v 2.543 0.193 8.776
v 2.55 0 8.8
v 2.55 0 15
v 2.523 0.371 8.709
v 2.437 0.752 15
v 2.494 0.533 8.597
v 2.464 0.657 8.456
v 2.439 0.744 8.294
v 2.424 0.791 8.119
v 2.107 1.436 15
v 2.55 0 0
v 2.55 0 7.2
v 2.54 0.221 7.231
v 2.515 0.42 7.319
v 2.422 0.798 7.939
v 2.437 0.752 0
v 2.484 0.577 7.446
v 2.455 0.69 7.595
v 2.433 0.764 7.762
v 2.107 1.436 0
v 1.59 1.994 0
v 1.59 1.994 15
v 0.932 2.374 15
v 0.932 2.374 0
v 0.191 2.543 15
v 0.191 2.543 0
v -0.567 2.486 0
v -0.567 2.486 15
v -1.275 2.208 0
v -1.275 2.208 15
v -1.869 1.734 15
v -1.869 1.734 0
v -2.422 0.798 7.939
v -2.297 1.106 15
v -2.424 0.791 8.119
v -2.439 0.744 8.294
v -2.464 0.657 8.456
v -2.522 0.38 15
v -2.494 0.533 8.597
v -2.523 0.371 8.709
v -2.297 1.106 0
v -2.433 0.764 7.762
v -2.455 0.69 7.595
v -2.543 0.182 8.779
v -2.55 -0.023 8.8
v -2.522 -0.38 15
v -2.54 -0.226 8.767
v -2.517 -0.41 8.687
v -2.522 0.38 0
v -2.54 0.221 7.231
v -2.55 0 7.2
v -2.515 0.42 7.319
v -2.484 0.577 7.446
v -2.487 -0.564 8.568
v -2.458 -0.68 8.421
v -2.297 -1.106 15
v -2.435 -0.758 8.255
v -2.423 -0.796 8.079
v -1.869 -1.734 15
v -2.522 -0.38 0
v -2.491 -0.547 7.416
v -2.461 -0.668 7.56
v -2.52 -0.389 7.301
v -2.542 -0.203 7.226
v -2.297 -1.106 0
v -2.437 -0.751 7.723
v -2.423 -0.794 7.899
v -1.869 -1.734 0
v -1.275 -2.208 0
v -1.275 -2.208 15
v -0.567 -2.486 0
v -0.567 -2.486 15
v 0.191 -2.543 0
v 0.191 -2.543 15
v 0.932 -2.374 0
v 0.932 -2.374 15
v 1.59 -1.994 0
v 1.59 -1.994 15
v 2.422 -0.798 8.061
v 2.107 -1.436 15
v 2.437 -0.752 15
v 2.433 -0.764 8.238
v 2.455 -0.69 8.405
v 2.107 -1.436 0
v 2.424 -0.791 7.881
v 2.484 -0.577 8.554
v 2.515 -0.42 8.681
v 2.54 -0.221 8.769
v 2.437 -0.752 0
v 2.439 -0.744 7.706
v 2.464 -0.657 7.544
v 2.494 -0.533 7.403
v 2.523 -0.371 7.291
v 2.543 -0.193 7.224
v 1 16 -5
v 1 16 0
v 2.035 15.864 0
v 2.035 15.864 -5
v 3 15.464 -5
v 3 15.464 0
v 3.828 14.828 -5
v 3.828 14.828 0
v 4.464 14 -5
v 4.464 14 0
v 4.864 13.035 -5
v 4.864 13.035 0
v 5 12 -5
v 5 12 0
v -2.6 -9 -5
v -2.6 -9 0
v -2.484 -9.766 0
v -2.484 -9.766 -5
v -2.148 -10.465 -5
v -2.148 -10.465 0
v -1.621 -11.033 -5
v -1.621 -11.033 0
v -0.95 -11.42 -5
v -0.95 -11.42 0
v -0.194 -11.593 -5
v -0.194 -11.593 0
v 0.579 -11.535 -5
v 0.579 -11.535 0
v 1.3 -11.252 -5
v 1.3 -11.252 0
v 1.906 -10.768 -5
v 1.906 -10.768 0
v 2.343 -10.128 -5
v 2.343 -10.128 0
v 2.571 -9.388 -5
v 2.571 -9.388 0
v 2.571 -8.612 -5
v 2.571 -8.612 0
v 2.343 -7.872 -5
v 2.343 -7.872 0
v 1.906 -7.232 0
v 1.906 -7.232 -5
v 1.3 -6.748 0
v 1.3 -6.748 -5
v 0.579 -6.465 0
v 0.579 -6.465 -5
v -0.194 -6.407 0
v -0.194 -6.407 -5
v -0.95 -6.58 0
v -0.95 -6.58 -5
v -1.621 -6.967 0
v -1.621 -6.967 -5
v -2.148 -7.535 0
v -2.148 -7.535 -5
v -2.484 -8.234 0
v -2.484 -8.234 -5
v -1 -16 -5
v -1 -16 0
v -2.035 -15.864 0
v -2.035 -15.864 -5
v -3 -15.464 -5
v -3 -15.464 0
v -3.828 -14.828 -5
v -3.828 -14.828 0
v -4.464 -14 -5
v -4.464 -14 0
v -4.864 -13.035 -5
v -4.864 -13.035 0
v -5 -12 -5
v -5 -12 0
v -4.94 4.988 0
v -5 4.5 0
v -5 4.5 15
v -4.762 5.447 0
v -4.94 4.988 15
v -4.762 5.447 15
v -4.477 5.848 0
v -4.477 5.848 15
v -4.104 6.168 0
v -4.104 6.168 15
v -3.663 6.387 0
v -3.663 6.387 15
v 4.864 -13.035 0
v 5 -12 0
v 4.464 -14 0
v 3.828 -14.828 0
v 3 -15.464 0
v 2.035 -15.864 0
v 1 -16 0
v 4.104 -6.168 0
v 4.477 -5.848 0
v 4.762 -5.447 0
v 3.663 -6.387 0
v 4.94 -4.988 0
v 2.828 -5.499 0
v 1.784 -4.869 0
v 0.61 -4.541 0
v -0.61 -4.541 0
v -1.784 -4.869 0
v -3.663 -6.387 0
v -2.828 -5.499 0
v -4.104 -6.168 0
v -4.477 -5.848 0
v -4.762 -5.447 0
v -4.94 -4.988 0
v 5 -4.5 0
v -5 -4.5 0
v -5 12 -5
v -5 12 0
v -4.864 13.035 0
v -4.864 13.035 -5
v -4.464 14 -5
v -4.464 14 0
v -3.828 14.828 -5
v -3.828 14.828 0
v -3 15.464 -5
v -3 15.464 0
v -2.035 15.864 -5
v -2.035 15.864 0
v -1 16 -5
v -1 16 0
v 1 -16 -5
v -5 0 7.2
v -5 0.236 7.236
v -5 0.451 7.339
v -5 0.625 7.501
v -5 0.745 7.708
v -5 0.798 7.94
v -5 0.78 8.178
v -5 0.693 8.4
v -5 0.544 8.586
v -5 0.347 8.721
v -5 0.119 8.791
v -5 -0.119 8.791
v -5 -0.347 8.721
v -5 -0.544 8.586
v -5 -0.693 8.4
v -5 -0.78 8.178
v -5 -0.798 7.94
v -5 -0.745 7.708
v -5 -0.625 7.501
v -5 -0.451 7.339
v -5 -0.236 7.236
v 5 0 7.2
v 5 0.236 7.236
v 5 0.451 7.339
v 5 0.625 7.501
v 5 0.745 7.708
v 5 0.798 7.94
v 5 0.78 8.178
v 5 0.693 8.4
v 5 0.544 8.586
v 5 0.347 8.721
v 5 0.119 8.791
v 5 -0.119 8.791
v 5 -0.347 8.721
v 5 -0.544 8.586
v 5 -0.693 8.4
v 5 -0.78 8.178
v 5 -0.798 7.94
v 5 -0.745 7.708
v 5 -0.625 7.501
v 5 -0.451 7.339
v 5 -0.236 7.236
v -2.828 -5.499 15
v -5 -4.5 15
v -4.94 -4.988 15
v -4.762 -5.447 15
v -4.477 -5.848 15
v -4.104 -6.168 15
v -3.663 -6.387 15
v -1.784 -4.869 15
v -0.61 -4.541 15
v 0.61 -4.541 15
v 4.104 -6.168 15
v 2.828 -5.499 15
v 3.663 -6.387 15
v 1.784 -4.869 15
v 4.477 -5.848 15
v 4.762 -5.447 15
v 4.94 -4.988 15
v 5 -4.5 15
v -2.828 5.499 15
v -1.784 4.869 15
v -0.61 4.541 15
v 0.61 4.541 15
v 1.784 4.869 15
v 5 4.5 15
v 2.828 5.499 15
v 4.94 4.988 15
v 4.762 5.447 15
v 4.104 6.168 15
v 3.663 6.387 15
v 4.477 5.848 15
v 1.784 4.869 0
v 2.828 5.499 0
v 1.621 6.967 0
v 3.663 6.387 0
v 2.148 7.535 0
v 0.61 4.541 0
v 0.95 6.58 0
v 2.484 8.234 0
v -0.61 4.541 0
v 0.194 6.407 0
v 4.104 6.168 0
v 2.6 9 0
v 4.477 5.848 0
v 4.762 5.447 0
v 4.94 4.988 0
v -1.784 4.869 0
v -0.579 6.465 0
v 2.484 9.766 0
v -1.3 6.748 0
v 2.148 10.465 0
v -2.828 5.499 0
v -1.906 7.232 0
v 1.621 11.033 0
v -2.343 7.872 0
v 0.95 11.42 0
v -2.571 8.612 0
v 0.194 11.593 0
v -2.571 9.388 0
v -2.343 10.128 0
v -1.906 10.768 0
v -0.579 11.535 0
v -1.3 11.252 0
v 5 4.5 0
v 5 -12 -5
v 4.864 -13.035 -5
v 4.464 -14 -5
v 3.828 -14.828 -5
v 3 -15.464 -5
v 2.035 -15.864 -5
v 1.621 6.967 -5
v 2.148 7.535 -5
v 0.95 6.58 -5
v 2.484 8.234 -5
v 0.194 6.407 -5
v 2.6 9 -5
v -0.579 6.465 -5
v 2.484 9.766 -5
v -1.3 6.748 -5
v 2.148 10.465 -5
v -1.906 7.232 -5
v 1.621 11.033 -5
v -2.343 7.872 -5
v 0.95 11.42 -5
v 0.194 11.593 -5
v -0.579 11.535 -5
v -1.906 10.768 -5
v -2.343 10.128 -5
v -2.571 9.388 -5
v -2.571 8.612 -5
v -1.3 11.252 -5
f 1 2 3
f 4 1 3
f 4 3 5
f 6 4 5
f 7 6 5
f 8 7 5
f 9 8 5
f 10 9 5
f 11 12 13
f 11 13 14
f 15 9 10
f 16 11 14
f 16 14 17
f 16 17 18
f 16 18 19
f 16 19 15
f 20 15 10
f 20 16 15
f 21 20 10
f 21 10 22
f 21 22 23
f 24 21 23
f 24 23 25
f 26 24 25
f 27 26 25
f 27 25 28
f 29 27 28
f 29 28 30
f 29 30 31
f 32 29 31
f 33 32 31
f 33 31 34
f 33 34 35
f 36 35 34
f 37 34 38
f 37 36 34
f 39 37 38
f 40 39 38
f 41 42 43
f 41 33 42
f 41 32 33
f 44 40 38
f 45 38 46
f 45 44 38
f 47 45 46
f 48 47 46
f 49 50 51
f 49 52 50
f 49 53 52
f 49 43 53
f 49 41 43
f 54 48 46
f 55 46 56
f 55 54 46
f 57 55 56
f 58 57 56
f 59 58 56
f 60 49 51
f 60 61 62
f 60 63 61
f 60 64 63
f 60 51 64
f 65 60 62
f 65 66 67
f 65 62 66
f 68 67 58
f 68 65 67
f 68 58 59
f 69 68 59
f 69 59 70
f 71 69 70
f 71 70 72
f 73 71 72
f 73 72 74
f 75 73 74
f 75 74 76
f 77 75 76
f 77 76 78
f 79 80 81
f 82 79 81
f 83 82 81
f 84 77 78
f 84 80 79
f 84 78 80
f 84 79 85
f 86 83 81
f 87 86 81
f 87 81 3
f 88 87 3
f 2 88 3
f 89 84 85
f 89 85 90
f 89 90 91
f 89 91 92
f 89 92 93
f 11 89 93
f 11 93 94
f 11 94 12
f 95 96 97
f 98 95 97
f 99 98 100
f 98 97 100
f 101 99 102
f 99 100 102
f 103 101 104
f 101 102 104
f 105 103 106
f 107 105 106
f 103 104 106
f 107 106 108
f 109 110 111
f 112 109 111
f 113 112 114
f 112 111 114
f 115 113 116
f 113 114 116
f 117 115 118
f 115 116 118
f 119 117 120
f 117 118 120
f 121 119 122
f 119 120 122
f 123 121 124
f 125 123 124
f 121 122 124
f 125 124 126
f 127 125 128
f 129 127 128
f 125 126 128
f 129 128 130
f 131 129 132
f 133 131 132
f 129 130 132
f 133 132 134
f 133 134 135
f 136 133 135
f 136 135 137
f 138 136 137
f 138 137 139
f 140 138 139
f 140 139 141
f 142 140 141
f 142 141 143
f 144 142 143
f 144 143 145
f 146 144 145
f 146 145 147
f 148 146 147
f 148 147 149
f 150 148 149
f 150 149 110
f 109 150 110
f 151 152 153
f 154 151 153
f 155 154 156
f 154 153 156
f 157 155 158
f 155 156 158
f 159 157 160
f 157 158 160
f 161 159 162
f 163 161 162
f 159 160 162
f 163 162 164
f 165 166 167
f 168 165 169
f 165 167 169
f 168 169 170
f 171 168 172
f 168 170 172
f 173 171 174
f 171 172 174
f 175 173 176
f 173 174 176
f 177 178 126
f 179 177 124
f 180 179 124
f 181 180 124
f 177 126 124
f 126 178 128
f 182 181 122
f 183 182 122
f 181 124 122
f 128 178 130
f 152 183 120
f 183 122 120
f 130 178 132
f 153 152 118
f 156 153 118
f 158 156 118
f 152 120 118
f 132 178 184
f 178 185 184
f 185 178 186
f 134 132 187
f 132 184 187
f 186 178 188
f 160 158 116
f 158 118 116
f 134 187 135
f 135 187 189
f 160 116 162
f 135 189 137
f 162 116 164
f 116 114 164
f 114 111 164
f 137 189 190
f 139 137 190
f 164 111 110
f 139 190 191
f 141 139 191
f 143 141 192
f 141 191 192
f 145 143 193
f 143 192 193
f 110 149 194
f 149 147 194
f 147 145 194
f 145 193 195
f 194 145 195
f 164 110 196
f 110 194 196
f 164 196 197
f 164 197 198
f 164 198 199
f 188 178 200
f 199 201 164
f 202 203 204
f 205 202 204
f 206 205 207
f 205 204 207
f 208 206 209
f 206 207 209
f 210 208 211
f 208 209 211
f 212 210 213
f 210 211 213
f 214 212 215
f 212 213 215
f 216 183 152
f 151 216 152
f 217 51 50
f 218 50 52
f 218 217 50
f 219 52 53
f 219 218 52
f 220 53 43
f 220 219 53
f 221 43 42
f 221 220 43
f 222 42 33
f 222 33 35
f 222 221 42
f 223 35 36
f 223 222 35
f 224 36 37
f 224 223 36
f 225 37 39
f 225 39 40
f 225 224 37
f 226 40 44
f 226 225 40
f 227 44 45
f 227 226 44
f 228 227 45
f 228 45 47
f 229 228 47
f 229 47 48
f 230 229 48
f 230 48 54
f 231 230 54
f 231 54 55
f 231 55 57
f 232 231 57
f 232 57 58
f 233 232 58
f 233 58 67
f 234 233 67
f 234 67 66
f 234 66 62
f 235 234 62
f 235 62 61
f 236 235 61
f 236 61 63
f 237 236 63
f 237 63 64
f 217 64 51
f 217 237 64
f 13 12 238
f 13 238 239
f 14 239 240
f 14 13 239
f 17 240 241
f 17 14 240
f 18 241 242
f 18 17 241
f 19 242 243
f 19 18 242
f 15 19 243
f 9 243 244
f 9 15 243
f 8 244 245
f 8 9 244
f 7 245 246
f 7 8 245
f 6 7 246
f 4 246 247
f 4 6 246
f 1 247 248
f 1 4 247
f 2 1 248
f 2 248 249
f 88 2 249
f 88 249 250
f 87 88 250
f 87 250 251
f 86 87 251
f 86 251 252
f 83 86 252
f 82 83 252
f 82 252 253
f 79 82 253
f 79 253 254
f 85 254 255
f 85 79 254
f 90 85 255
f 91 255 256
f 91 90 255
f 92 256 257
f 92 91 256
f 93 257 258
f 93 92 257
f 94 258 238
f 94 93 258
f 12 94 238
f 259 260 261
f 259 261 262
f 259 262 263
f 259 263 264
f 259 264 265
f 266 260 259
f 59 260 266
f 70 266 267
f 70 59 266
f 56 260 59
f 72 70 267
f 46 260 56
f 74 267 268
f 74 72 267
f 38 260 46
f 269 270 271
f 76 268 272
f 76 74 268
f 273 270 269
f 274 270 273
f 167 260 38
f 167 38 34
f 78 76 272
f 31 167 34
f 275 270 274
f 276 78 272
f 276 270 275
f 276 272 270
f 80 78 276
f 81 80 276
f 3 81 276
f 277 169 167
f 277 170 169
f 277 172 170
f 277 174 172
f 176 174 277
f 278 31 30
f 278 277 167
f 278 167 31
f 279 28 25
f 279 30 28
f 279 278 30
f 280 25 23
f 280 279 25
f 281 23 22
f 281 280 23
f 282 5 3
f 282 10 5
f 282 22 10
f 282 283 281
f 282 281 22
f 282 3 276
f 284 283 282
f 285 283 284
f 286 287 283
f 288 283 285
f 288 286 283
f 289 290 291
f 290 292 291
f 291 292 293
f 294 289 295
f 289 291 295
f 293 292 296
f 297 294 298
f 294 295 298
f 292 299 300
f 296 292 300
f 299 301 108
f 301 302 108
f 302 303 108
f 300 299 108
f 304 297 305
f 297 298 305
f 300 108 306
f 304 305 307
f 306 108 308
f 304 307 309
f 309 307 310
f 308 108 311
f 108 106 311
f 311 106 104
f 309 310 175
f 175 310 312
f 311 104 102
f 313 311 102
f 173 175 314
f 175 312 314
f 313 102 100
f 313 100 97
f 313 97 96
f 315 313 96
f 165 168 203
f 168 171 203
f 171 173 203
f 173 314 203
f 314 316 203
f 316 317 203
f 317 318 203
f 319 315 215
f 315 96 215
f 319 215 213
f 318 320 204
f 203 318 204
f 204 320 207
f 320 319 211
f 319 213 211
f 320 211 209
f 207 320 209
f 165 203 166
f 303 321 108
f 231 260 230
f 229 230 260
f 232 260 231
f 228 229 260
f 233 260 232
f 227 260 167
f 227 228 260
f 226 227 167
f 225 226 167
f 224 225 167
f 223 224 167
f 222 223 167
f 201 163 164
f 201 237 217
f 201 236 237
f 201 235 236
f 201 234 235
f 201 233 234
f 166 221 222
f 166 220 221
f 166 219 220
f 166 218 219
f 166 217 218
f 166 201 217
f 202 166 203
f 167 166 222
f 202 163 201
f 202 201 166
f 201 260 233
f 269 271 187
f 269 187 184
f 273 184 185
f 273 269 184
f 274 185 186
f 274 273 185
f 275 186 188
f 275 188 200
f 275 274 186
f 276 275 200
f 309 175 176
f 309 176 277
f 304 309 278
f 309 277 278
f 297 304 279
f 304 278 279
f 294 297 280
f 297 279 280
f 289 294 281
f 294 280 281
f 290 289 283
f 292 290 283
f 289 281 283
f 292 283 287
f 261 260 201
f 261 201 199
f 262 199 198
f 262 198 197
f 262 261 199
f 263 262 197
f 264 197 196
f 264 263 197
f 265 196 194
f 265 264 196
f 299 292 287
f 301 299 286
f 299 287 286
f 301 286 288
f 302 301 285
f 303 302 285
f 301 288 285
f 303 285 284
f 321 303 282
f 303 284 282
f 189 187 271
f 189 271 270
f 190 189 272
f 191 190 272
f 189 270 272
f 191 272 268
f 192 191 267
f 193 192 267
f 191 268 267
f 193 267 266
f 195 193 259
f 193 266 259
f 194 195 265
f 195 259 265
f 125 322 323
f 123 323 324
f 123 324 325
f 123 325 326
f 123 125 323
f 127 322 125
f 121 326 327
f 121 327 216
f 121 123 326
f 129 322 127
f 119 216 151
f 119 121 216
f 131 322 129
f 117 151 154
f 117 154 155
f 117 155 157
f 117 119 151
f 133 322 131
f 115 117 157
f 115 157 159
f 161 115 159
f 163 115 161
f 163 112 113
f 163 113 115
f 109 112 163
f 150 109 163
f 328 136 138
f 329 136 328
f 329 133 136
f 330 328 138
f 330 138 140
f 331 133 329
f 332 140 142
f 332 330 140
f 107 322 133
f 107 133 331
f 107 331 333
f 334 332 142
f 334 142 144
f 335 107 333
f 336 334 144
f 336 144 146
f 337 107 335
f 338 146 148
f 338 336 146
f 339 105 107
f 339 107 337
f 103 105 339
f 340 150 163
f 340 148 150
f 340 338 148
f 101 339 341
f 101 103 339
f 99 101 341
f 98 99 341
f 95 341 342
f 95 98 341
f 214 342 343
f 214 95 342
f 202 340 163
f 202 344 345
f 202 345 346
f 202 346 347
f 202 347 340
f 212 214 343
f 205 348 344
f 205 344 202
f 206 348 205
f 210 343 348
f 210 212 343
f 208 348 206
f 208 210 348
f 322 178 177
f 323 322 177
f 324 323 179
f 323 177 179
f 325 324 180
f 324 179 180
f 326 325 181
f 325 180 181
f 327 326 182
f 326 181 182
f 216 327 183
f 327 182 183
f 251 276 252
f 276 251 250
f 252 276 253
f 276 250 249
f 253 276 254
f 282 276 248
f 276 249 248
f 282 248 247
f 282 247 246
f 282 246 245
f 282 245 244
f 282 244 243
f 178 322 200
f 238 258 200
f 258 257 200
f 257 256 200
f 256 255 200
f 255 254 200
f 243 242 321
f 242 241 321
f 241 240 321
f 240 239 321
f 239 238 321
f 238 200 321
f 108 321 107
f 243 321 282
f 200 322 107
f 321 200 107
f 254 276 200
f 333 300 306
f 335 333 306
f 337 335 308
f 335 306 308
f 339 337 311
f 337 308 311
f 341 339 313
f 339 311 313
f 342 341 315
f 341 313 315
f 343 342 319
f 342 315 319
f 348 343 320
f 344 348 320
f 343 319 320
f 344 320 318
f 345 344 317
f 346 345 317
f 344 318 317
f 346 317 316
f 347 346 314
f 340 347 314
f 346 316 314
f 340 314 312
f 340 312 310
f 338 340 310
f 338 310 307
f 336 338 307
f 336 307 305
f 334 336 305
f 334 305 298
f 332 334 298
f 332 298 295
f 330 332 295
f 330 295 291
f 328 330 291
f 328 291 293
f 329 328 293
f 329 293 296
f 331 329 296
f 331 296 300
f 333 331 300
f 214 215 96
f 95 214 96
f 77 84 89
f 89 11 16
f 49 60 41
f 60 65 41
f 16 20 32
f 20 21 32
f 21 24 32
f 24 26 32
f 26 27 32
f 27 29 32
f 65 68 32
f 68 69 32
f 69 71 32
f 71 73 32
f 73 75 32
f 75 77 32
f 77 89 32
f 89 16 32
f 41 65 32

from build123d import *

# Parameters (mm, degrees)
SKETCH1_R               = 2.6
BOSS_EXTRUDE1_DEPTH     = 5
SKETCH2_W               = 10
SKETCH2_H               = 13
SKETCH2_R               = 2.55
BOSS_EXTRUDE3_DEPTH     = 15
FILLET2_R               = 2
SKETCH6_R               = 4.5
CUT_EXTRUDE2_DEPTH      = 15
CUT_EXTRUDE3_DEPTH      = 25.103941586
CUT_EXTRUDE3_DEPTH_BACK = 25.103941586
SKETCH7_R               = 0.8


with BuildPart() as part:
    # Sketch1 → Boss-Extrude1 (new body)
    with BuildSketch(Plane.XY):
        with BuildLine():
            Line((-5, -12), (-5, 12))
            ThreePointArc((-5, 12), (-3.828427125, 14.828427125), (-1, 16))
            Line((-1, 16), (1, 16))
            ThreePointArc((1, 16), (3.828427125, 14.828427125), (5, 12))
            Line((5, 12), (5, -12))
            ThreePointArc((5, -12), (3.828427125, -14.828427125), (1, -16))
            Line((1, -16), (-1, -16))
            ThreePointArc((-1, -16), (-3.828427125, -14.828427125), (-5, -12))
        make_face()
        with Locations((0, 9)):
            Circle(SKETCH1_R, mode=Mode.SUBTRACT)
        with Locations(Location((0, -9, 0), (0, 0, 180))):
            Circle(SKETCH1_R, mode=Mode.SUBTRACT)
    extrude(amount=-BOSS_EXTRUDE1_DEPTH)

    # Sketch2 → Boss-Extrude3 (add)
    with BuildSketch(Plane.XY):
        Rectangle(SKETCH2_W, SKETCH2_H)
        Circle(SKETCH2_R, mode=Mode.SUBTRACT)
    extrude(amount=BOSS_EXTRUDE3_DEPTH)

    # Fillet2
    fillet2_edges = [part.edges().sort_by_distance(p)[0] for p in [
        (5, -6.5, 7.5),
        (5, 6.5, 7.5),
        (-5, 6.5, 7.5),
        (-5, -6.5, 7.5),
    ]]
    fillet(fillet2_edges, radius=FILLET2_R)

    # Sketch6 → Cut-Extrude2 (cut)
    with BuildSketch(Plane.XY.offset(15)):
        with Locations((0, 9)):
            Circle(SKETCH6_R)
        with Locations((0, -9)):
            Circle(SKETCH6_R)
    extrude(amount=-CUT_EXTRUDE2_DEPTH, mode=Mode.SUBTRACT)

    # Sketch7 → Cut-Extrude3 (cut, two sides: drawn at the far end of the back side and taken through both)
    with BuildSketch(Plane(origin=(5, 0, 0), x_dir=(0, 0, -1), z_dir=(1, 0, 0)).offset(-CUT_EXTRUDE3_DEPTH_BACK)):
        with Locations((-8, 0)):
            Circle(SKETCH7_R)
    extrude(amount=CUT_EXTRUDE3_DEPTH + CUT_EXTRUDE3_DEPTH_BACK, mode=Mode.SUBTRACT)


solid = part.part
